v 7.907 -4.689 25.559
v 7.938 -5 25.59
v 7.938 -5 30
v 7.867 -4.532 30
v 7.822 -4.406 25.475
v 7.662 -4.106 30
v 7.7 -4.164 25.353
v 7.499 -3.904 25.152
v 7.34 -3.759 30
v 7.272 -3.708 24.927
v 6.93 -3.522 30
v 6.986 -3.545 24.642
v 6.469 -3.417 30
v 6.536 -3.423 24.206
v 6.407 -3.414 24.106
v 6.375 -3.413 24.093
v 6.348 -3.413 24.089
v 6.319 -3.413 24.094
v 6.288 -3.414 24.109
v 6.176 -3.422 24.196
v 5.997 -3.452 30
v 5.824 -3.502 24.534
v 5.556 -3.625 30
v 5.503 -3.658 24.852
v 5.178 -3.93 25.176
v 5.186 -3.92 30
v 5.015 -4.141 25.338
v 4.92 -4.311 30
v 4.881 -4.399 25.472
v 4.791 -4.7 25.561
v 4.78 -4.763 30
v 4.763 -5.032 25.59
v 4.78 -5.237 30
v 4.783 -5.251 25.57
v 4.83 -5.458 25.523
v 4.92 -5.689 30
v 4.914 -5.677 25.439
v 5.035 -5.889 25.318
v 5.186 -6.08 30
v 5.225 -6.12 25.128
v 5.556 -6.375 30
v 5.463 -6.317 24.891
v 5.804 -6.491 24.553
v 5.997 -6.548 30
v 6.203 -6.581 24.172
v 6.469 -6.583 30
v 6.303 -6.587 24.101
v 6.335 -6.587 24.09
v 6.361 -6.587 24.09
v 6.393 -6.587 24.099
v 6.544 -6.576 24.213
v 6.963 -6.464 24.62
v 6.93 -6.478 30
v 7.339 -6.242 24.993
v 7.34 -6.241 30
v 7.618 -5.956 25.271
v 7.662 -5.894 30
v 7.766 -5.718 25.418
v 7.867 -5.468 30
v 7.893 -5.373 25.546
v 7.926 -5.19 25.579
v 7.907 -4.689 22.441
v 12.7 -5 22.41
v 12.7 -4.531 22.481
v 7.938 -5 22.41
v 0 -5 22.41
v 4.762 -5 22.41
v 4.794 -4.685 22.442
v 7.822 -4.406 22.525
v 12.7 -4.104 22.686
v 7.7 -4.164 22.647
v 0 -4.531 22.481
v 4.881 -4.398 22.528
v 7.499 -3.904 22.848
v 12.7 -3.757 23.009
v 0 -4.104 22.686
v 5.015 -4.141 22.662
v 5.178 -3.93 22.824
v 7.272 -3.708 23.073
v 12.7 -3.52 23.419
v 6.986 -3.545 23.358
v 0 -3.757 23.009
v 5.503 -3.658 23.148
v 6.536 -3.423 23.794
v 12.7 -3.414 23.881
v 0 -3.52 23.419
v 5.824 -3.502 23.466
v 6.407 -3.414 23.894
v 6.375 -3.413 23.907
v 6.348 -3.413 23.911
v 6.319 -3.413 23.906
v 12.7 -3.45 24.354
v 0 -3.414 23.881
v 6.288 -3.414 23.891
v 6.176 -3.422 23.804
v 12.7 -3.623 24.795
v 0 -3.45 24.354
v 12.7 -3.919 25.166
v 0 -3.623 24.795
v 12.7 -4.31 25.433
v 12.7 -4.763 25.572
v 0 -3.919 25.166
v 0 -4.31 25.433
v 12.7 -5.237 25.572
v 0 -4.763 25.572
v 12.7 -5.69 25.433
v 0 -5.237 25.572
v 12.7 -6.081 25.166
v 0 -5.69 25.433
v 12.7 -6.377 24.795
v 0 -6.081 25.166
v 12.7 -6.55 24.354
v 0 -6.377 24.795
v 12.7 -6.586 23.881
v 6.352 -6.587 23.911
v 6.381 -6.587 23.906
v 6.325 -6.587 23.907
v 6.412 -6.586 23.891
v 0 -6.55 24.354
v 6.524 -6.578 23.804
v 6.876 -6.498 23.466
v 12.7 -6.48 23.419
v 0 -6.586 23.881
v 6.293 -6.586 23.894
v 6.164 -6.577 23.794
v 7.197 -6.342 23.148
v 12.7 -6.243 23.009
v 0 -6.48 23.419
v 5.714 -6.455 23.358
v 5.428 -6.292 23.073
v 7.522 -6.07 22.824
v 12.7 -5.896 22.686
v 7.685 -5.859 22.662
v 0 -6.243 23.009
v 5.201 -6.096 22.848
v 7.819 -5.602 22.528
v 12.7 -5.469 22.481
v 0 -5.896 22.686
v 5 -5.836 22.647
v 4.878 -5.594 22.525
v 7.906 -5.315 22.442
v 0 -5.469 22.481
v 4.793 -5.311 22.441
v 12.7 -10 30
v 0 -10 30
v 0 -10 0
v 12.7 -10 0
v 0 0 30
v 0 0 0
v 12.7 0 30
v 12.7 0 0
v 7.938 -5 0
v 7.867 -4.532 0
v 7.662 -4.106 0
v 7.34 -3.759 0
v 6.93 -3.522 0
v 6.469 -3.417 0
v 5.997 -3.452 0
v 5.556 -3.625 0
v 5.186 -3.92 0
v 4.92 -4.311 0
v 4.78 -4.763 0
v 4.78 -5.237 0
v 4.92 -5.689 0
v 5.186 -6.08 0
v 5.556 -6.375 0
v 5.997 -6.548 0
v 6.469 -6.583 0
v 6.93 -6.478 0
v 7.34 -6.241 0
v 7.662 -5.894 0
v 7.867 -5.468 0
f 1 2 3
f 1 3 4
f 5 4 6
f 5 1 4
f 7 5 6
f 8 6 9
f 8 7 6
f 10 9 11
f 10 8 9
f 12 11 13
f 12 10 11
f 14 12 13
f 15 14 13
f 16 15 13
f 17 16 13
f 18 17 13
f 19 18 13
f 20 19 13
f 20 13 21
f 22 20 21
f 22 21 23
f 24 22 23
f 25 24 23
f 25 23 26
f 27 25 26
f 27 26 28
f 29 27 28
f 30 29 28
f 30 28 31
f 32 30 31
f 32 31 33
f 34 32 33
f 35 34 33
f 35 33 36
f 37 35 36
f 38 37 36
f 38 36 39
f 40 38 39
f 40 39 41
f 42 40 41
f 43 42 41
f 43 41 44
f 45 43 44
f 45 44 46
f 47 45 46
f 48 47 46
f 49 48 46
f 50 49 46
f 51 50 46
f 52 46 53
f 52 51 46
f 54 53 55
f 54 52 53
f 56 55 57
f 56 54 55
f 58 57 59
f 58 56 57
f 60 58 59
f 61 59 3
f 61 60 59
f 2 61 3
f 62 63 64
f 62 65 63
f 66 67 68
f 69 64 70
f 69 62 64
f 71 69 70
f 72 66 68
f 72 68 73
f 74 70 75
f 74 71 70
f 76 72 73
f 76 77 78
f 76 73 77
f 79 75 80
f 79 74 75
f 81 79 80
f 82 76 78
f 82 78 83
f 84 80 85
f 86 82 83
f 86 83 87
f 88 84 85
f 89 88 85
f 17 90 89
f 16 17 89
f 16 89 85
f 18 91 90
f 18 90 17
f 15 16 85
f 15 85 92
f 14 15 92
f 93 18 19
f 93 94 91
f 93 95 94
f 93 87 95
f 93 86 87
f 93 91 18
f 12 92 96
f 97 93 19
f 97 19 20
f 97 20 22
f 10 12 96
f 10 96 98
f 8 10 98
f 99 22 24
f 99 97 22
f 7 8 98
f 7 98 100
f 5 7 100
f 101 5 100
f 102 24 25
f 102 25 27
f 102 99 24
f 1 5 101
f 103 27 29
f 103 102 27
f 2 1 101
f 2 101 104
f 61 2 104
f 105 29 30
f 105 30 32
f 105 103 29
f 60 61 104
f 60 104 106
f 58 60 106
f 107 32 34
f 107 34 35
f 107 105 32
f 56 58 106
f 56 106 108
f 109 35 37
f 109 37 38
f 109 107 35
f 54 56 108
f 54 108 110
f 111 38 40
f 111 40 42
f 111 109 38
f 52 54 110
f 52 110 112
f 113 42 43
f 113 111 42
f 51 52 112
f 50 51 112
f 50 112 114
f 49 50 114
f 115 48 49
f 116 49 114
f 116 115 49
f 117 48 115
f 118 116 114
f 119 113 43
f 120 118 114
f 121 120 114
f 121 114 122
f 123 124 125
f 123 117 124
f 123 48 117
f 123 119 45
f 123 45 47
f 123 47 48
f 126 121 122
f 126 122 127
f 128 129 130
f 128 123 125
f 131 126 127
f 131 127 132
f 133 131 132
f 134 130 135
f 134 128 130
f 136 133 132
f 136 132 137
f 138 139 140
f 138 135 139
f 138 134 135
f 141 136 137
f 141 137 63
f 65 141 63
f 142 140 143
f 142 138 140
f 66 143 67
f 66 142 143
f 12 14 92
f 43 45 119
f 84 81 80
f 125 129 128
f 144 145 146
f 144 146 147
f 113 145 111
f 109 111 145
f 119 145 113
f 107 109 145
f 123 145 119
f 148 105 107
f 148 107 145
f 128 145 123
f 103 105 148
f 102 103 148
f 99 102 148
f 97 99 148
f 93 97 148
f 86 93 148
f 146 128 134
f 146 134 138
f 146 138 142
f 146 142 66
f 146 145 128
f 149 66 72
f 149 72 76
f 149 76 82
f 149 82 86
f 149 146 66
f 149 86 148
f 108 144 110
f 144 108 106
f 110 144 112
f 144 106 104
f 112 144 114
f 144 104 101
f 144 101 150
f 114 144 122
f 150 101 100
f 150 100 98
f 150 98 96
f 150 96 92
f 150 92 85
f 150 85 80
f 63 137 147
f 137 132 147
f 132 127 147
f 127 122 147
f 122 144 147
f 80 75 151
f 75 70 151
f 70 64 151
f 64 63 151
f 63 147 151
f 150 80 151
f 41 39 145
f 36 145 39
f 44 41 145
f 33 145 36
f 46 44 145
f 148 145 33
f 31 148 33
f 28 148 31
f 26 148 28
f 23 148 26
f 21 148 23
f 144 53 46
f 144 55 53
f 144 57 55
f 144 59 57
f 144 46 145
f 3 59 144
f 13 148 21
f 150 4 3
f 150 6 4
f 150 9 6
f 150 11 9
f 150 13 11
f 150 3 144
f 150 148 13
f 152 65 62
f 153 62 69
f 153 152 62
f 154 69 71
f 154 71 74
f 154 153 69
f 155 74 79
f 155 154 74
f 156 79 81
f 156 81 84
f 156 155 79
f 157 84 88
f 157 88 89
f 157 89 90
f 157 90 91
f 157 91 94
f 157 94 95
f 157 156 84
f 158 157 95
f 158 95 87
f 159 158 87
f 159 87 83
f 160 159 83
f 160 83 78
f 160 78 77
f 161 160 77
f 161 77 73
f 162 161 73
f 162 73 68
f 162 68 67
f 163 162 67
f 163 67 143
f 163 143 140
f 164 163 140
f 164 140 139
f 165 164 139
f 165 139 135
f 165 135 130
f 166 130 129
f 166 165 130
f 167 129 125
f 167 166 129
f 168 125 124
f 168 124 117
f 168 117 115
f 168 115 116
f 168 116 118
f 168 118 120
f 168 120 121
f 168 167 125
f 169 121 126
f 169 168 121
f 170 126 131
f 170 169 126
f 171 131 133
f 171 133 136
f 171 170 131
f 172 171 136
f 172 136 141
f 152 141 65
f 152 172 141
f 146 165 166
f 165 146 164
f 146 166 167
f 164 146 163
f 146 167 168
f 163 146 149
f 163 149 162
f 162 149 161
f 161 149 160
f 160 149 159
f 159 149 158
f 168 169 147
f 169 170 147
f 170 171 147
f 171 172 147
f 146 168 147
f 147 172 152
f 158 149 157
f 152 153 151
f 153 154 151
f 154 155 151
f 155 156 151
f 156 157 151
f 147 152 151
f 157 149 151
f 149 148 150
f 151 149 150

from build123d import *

# Parameters (mm, degrees)
SKETCH1_W           = 12.7
SKETCH1_H           = 10
SKETCH1_R           = 1.5875
BOSS_EXTRUDE1_DEPTH = 30
SKETCH2_R           = 1.59
CUT_EXTRUDE1_DEPTH  = 30


with BuildPart() as part:
    # Sketch1 → Boss-Extrude1 (new body)
    with BuildSketch(Plane.XY):
        with Locations((6.35, -5)):
            Rectangle(SKETCH1_W, SKETCH1_H)
        with Locations((6.35, -5)):
            Circle(SKETCH1_R, mode=Mode.SUBTRACT)
    extrude(amount=BOSS_EXTRUDE1_DEPTH)

    # Sketch2 → Cut-Extrude1 (cut)
    with BuildSketch(Plane(origin=(0, 0, 0), x_dir=(0, 0, -1), z_dir=(1, 0, 0))):
        with Locations((-24, -5)):
            Circle(SKETCH2_R)
    extrude(amount=CUT_EXTRUDE1_DEPTH, mode=Mode.SUBTRACT)


solid = part.part
